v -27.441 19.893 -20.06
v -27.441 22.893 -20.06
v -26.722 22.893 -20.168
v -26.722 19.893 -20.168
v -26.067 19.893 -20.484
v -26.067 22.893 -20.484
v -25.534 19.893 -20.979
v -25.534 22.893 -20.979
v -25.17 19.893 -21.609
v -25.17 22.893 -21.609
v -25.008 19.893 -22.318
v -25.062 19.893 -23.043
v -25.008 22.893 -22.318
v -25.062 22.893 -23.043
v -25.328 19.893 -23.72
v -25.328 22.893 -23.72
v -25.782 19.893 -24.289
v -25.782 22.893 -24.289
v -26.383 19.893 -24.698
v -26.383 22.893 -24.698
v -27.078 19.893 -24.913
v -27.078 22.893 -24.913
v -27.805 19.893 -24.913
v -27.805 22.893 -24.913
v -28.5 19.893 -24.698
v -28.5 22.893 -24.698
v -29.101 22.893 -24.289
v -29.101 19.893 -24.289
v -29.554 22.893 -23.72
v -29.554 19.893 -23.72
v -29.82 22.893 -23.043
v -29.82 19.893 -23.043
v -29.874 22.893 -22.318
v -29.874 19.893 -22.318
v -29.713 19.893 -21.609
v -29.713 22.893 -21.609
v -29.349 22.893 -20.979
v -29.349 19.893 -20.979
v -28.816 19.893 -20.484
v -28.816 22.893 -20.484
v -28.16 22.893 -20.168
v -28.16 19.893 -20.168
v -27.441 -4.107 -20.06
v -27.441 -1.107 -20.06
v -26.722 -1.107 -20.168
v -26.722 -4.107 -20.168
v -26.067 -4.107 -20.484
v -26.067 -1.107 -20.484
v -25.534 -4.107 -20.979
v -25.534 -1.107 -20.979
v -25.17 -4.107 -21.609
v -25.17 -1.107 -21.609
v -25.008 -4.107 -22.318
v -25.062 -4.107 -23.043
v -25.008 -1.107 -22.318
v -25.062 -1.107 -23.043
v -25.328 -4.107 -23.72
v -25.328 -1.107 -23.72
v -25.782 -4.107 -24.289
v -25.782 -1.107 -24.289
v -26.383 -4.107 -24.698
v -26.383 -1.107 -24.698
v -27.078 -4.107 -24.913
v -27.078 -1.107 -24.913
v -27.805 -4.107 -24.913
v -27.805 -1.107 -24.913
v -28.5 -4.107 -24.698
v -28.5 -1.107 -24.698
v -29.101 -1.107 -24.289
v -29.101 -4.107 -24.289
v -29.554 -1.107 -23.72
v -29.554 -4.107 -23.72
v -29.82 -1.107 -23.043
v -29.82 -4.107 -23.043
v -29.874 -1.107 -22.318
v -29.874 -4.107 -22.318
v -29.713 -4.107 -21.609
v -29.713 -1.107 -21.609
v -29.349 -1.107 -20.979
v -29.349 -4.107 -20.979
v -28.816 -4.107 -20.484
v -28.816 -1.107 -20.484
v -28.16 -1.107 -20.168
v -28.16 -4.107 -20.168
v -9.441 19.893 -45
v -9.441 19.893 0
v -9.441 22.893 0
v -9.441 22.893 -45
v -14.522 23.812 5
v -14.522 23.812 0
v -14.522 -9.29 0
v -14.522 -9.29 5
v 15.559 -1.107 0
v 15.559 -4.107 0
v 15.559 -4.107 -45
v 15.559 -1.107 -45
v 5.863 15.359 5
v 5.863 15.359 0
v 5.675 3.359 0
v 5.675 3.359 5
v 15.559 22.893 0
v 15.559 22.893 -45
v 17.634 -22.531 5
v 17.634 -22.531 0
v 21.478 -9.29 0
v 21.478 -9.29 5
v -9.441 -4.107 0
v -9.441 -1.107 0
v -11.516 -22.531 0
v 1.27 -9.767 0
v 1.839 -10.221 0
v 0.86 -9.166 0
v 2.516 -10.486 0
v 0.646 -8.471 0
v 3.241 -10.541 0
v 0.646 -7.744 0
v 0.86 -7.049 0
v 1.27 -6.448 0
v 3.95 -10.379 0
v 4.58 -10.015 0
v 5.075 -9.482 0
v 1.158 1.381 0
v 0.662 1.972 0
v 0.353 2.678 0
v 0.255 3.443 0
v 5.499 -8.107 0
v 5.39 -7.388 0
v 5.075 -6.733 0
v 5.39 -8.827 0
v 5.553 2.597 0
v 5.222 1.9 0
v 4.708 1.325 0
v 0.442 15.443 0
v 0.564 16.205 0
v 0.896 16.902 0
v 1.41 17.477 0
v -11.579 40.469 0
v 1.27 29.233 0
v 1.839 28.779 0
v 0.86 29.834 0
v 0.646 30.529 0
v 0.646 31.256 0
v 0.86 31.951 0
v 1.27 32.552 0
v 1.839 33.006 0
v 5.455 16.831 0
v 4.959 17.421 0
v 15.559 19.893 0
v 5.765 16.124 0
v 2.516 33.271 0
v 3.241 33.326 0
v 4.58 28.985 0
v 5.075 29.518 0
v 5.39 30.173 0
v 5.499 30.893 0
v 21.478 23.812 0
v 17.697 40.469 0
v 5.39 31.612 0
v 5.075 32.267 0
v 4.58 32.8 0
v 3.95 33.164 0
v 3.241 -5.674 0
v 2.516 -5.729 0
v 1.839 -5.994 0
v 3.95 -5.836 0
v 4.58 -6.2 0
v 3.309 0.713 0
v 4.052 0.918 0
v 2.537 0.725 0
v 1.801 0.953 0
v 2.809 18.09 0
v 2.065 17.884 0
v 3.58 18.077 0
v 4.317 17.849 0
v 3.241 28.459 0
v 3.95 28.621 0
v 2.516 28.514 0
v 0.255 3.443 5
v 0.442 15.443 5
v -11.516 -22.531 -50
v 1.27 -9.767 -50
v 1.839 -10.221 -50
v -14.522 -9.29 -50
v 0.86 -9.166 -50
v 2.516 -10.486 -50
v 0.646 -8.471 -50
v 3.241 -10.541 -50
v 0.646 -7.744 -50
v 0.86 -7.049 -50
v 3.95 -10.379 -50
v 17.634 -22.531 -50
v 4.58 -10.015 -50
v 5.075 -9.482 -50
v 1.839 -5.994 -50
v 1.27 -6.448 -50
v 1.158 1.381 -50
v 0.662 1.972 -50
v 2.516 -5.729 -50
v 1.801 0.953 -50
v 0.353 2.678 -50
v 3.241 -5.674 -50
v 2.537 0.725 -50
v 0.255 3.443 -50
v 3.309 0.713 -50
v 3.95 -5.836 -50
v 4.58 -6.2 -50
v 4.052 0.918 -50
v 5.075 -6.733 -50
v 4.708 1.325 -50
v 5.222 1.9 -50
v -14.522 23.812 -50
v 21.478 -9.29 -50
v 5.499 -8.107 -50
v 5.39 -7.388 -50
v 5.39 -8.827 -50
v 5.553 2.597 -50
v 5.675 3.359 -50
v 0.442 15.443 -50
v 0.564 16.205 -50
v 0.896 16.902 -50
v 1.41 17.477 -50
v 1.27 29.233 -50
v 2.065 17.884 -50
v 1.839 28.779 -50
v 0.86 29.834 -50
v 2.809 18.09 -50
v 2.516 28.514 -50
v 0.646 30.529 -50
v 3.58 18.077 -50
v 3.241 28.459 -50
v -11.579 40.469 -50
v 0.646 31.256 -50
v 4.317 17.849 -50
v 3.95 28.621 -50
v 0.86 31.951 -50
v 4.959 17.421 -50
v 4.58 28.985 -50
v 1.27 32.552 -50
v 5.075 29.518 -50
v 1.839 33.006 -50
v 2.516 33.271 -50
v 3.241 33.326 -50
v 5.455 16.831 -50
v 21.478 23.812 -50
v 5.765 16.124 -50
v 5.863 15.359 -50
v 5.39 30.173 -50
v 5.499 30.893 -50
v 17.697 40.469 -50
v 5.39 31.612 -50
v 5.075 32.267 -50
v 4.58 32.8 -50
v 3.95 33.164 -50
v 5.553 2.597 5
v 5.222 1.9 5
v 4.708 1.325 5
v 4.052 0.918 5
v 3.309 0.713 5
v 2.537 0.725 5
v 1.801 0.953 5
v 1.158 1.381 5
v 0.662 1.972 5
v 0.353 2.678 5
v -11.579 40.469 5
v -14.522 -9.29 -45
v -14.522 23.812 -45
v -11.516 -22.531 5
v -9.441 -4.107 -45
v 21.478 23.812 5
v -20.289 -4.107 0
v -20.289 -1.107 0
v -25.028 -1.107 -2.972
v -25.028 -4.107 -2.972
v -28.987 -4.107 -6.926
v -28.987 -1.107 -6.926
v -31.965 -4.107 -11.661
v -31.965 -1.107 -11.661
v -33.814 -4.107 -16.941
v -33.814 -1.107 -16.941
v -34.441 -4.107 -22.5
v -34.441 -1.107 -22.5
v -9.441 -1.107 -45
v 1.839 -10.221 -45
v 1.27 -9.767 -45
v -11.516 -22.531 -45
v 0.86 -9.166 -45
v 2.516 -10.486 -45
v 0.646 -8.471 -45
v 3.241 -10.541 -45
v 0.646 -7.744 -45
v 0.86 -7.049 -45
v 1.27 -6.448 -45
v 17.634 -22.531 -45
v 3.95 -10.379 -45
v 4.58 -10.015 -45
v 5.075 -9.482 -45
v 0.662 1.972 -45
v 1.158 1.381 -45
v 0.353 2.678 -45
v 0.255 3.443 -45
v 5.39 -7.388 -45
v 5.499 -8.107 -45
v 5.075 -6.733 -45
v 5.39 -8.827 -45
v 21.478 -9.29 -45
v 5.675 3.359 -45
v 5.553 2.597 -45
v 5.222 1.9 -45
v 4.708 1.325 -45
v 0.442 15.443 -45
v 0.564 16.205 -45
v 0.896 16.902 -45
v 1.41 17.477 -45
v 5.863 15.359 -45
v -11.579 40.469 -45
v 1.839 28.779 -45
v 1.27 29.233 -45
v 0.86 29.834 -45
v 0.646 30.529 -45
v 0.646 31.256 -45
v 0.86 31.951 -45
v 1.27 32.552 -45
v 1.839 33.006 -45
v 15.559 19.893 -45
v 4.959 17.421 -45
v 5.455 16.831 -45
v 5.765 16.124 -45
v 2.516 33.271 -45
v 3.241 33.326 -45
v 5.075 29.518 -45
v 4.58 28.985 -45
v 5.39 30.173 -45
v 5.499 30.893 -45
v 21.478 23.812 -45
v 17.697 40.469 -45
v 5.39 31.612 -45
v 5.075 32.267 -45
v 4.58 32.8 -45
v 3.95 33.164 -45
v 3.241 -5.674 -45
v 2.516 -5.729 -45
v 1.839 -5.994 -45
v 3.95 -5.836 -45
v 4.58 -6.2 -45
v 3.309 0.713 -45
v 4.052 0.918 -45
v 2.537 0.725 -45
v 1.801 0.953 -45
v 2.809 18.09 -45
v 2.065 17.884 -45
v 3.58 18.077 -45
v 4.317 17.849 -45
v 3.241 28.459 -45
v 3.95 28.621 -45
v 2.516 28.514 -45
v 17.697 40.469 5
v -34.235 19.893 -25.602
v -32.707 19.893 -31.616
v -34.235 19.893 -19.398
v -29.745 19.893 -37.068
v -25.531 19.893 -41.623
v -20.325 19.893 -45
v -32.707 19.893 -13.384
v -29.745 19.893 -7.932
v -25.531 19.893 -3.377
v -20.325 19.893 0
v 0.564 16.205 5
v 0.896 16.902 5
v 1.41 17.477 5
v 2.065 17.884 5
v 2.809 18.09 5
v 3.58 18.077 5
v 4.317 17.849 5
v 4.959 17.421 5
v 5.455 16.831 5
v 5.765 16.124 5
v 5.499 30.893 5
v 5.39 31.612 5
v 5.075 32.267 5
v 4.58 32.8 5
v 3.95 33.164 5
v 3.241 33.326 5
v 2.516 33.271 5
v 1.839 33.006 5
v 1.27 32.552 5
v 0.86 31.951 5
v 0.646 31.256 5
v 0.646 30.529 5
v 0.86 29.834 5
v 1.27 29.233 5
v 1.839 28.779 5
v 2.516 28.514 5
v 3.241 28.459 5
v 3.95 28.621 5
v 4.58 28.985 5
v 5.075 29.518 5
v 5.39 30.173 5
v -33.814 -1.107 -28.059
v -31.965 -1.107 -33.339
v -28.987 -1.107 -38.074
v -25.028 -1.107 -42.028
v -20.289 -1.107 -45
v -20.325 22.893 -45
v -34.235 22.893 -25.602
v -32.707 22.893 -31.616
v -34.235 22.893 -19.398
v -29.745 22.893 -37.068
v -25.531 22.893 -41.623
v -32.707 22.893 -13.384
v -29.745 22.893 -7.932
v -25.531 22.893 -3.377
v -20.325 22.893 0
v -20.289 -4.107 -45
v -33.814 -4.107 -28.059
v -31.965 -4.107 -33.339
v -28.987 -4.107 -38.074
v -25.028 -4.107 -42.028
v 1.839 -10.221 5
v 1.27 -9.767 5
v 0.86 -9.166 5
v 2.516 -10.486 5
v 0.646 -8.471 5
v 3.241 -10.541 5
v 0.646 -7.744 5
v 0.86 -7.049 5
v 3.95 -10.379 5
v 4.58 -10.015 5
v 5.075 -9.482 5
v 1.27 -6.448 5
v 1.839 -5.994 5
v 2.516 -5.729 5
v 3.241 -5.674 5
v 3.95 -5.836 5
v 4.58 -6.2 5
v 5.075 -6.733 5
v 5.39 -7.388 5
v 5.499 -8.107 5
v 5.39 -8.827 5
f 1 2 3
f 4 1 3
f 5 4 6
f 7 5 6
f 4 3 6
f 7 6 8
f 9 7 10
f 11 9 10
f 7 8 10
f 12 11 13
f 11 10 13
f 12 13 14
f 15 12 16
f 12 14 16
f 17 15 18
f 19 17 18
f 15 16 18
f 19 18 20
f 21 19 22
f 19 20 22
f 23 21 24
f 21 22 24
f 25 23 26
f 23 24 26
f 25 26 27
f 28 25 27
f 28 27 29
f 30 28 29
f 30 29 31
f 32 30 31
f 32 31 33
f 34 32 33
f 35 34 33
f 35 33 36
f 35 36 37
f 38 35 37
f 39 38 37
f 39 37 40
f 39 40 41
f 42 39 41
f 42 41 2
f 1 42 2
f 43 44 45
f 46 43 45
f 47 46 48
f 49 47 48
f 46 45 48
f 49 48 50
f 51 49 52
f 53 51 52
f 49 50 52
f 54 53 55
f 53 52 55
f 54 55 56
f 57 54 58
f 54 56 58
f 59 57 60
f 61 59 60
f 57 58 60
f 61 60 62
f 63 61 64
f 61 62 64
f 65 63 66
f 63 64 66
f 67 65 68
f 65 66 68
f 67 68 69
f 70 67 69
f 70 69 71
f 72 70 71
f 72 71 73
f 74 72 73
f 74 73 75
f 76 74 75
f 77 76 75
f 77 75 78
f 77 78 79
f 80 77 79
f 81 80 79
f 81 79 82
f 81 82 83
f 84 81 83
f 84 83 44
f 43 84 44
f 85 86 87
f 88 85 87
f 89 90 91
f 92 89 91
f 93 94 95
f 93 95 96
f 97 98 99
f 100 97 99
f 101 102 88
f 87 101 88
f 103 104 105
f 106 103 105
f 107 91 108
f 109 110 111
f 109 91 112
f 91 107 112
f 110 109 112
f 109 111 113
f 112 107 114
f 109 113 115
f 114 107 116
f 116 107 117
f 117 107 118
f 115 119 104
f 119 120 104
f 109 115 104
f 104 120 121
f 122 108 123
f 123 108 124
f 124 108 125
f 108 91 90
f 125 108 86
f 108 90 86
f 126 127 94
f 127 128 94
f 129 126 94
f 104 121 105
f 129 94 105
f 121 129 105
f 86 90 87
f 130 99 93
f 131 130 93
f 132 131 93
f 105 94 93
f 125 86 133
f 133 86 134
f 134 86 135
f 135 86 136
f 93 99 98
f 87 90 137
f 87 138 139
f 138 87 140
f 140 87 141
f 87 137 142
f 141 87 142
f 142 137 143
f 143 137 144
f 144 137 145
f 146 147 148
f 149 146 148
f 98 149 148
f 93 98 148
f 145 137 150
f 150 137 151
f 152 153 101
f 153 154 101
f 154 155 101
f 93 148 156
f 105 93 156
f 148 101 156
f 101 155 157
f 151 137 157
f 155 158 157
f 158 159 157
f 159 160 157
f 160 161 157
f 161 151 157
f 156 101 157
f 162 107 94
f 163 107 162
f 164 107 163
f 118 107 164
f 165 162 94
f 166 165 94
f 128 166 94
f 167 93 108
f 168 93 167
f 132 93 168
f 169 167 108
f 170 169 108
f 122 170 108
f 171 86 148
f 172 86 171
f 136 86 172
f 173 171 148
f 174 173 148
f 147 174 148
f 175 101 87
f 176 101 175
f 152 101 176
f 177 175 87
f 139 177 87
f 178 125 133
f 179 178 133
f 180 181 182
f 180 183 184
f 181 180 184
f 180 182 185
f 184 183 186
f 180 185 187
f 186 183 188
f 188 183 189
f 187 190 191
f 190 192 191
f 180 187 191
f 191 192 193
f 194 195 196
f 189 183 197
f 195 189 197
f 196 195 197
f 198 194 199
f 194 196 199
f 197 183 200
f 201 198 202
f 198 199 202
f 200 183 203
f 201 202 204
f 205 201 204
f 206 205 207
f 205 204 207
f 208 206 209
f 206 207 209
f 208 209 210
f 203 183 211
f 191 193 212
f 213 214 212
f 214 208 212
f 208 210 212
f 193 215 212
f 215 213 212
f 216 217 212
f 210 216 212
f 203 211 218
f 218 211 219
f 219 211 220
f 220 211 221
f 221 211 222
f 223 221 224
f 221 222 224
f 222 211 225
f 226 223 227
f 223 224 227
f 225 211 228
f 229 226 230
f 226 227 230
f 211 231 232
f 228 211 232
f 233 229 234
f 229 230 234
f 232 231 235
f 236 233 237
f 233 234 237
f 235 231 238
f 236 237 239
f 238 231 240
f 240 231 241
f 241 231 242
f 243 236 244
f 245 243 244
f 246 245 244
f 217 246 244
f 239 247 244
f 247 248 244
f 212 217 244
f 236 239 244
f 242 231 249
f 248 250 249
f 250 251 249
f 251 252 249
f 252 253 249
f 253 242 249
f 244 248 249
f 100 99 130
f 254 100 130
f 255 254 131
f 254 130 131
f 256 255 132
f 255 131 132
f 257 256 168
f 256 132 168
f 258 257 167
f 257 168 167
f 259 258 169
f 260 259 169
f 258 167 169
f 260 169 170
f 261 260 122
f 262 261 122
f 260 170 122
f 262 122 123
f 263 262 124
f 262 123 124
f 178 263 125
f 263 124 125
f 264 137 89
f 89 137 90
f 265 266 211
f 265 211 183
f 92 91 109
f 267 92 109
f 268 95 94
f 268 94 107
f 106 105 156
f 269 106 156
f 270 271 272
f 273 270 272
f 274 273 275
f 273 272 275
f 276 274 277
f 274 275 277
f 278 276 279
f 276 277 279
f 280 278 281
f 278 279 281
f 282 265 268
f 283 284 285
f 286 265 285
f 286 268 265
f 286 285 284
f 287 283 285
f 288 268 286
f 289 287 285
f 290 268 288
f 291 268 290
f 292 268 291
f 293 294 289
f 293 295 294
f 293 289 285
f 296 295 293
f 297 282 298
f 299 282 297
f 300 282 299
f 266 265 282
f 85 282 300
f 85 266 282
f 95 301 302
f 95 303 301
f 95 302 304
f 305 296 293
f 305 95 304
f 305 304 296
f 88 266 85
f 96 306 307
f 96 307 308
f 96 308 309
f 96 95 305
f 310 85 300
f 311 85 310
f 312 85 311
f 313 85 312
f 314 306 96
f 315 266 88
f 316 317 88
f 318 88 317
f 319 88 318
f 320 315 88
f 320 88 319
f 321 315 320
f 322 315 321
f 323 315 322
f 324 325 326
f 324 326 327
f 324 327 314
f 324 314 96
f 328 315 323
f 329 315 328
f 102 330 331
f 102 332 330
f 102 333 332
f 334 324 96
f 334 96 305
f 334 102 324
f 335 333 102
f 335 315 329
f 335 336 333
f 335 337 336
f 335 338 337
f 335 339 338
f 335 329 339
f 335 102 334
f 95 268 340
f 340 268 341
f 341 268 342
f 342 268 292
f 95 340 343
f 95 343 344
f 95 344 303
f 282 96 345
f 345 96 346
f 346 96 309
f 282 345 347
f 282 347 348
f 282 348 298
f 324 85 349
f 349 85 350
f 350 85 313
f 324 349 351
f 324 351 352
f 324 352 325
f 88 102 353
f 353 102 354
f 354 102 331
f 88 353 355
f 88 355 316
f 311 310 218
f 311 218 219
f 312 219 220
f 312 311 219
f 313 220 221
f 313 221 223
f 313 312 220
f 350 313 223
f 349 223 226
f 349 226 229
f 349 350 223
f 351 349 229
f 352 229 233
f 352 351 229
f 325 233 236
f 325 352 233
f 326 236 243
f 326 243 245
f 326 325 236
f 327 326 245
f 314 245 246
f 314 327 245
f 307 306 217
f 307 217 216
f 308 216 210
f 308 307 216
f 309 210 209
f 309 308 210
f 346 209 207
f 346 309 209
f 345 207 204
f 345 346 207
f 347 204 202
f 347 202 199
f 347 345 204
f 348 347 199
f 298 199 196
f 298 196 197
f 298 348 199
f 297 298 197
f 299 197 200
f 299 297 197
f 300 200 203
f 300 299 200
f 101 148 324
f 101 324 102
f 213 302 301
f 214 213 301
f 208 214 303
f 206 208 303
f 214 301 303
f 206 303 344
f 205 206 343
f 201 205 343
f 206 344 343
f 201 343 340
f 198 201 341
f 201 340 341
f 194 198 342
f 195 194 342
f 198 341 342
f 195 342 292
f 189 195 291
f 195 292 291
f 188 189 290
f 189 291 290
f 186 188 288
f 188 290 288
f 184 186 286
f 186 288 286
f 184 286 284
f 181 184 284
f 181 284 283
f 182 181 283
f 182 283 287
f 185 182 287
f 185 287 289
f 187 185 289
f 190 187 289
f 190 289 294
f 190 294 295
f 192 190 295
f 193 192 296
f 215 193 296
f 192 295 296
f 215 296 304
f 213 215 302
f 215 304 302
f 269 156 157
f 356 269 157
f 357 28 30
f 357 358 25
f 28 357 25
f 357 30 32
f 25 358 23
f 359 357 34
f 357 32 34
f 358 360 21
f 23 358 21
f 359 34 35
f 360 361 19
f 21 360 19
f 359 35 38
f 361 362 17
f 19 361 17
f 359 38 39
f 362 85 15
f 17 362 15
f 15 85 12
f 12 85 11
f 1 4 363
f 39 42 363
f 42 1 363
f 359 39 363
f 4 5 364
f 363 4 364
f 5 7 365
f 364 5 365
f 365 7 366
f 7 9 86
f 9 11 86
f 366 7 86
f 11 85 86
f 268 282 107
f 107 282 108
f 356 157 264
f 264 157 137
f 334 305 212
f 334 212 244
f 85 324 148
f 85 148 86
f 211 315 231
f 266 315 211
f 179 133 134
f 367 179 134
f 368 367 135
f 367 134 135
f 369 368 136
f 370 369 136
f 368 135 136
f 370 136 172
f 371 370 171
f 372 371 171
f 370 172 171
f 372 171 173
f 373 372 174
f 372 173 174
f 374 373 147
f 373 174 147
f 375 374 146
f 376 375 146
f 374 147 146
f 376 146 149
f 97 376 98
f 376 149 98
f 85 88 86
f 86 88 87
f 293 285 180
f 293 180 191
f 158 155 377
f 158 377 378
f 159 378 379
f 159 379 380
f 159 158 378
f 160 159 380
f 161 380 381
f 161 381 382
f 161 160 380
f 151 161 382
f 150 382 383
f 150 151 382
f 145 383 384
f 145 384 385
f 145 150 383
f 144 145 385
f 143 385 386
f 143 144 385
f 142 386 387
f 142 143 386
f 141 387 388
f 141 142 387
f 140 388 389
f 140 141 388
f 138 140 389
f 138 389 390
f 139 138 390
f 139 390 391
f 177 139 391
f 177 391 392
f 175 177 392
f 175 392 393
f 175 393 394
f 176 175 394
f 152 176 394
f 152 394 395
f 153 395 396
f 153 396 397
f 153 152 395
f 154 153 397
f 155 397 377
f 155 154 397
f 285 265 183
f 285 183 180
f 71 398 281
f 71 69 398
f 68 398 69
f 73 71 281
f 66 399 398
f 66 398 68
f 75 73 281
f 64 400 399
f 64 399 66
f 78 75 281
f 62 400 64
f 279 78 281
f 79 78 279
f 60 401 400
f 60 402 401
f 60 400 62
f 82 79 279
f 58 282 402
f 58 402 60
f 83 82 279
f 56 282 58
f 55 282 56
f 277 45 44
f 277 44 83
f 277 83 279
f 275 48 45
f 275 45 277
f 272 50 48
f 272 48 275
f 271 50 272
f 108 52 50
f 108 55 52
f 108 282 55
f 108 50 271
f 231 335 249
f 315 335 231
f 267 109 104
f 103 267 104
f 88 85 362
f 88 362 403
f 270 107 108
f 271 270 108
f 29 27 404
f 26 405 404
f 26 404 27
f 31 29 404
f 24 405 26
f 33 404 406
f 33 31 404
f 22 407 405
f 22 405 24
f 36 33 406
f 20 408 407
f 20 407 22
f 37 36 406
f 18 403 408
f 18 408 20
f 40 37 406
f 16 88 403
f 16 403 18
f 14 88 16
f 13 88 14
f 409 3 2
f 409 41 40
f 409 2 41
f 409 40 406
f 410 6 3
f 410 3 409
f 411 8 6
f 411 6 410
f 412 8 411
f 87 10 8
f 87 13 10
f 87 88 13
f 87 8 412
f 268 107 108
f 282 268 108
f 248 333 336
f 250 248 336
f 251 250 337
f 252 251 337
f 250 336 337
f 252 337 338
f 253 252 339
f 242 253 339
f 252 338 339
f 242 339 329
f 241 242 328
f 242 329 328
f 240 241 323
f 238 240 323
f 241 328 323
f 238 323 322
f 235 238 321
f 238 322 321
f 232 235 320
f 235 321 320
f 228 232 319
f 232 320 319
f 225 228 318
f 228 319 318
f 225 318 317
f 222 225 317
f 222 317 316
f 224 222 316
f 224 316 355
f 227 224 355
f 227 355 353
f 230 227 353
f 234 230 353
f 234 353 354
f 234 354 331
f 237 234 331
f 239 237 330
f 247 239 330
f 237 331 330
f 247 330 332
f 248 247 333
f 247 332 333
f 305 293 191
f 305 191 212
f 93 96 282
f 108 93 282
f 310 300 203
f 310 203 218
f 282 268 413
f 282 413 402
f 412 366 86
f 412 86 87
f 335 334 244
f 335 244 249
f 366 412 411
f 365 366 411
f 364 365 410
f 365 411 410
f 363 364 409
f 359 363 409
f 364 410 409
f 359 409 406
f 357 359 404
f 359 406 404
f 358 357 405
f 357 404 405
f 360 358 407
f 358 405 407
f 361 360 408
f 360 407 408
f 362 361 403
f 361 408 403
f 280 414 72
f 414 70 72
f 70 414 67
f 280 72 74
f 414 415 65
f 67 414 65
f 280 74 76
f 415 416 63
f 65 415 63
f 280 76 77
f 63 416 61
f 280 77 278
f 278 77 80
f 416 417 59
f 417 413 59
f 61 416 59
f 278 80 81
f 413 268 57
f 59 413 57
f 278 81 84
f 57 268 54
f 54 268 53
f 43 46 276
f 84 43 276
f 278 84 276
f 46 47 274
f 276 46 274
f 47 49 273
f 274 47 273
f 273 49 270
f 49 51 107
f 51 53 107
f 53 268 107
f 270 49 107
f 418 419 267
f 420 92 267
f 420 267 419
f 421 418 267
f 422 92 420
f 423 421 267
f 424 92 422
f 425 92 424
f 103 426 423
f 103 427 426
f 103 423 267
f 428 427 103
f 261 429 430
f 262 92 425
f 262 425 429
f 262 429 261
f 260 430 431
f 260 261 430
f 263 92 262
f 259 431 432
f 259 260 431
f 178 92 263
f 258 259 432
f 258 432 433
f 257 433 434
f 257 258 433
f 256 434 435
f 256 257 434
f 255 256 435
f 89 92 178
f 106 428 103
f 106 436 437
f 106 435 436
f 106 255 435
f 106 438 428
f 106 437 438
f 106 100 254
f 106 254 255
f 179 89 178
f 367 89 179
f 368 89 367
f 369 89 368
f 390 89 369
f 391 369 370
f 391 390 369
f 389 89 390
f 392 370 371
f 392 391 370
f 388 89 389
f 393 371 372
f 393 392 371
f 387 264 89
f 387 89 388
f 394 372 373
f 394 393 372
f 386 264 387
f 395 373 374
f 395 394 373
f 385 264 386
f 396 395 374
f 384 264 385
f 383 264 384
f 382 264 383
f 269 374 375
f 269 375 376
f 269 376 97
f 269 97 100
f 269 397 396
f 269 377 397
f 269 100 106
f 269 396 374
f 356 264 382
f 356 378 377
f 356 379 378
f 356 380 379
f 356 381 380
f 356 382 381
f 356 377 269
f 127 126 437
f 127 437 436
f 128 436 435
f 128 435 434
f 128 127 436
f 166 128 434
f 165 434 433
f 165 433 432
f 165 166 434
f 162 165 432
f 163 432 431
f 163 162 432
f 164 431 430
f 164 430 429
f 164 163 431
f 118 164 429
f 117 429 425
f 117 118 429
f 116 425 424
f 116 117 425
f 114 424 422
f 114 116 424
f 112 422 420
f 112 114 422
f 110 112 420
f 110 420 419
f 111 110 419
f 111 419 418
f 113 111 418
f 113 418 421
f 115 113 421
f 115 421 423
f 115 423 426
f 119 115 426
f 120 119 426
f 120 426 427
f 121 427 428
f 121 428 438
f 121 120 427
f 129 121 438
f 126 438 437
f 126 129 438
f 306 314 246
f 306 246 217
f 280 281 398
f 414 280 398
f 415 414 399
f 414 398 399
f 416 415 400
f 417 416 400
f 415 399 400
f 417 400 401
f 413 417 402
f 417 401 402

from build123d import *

# Parameters (mm, degrees)
SKETCH_1_R           = 2.44
SKETCH_1_W           = 25
SKETCH_1_H           = 3
EXTRUDE_1_DEPTH      = 5
EXTRUDE_5_DEPTH      = 22.5
EXTRUDE_5_DEPTH_BACK = 5
SKETCH_6_W           = 25
SKETCH_6_H           = 3
SKETCH_7_W           = 45
SKETCH_7_H           = 3
EXTRUDE_6_DEPTH      = 25
CUT_EXTRUDE_1_DEPTH  = 3
SKETCH_9_W           = 45
SKETCH_9_H           = 3
EXTRUDE_7_DEPTH      = 25
CUT_EXTRUDE_2_DEPTH  = 3
SKETCH_11_R          = 2.44
CUT_EXTRUDE_4_DEPTH  = 27


with BuildPart() as part:
    # 草图1 → 凸台-拉伸1 (new body)
    with BuildSketch(Plane.XY):
        Polygon((17.696605027, 40.469491525), (-11.579043351, 40.469491525), (-14.522033898, 23.811864407), (-14.522033898, -9.289830508), (-11.516336634, -22.530508475), (17.633898309, -22.530508475), (21.477966102, -9.289830508), (21.477966102, 23.811864407), align=None)
        with Locations((3.058780838, 30.892569201)):
            Circle(SKETCH_1_R, mode=Mode.SUBTRACT)
        with Locations((3.058780838, -8.107430799)):
            Circle(SKETCH_1_R, mode=Mode.SUBTRACT)
        with Locations((3.058780838, 21.392569201)):
            Rectangle(SKETCH_1_W, SKETCH_1_H, mode=Mode.SUBTRACT)
        with Locations((3.058780838, -2.607430799)):
            Rectangle(SKETCH_1_W, SKETCH_1_H, mode=Mode.SUBTRACT)
        with BuildLine():
            Line((0.254992558, 3.443382419), (0.442492558, 15.443382419))
            ThreePointArc((0.442492558, 15.443382419), (3.194875186, 18.111076351), (5.862569118, 15.358693723))
            Line((5.862569118, 15.358693723), (5.675069118, 3.358693723))
            ThreePointArc((5.675069118, 3.358693723), (2.92268649, 0.690999791), (0.254992558, 3.443382419))
        make_face(mode=Mode.SUBTRACT)
    extrude(amount=EXTRUDE_1_DEPTH)

    # 草图6 → 凸台-拉伸5 (add, two sides: drawn at the far end of the back side and taken through both)
    with BuildSketch(Plane(origin=(0, 0, 0), x_dir=(-1, 0, 0), z_dir=(0, 0, -1)).offset(-EXTRUDE_5_DEPTH_BACK)):
        with Locations((-3.058780838, 21.392569201)):
            Rectangle(SKETCH_6_W, SKETCH_6_H)
        with Locations((-3.058780838, -2.607430799)):
            Rectangle(SKETCH_6_W, SKETCH_6_H)
    extrude(amount=EXTRUDE_5_DEPTH + EXTRUDE_5_DEPTH_BACK)

    # 镜向2: part across plane


with BuildPart() as part_1:
    add(part.part)
    add(part.part.mirror(Plane(origin=(0, 0, -22.5), x_dir=(1, 0, 0), z_dir=(0, 0, -1))))


with BuildPart() as body_2:
    # 草图7 → 凸台-拉伸6 (new body)
    with BuildSketch(Plane.ZY.offset(9.441219162)):
        with Locations((-22.5, 21.392569201)):
            Rectangle(SKETCH_7_W, SKETCH_7_H)
    extrude(amount=EXTRUDE_6_DEPTH)

    # 草图8 → 切除-拉伸1 (cut)
    with BuildSketch(Plane(origin=(0, 22.892569201, 0), x_dir=(1, 0, 0), z_dir=(0, 1, 0))):
        with BuildLine():
            Line((-34.441219162, 0), (-20.325379476, 0))
            ThreePointArc((-20.325379476, 0), (-34.428132117, 22.5), (-20.325379476, 45))
            Line((-20.325379476, 45), (-34.441219162, 45))
            Line((-34.441219162, 45), (-34.441219162, 0))
        make_face()
    extrude(amount=-CUT_EXTRUDE_1_DEPTH, mode=Mode.SUBTRACT)


with BuildPart() as body_3:
    # 草图9 → 凸台-拉伸7 (new body)
    with BuildSketch(Plane.ZY.offset(9.441219162)):
        with Locations((-22.5, -2.607430799)):
            Rectangle(SKETCH_9_W, SKETCH_9_H)
    extrude(amount=EXTRUDE_7_DEPTH)

    # 草图10 → 切除-拉伸2 (cut)
    with BuildSketch(Plane(origin=(0, -1.107430799, 0), x_dir=(1, 0, 0), z_dir=(0, 1, 0))):
        with BuildLine():
            ThreePointArc((-34.441219162, 22.5), (-30.609078149, 35.790297055), (-20.289258761, 45))
            Line((-20.289258761, 45), (-34.441219162, 45))
            Line((-34.441219162, 45), (-34.441219162, 22.5))
        make_face()
        with BuildLine():
            Line((-34.441219162, 0), (-20.289258761, 0))
            ThreePointArc((-20.289258761, 0), (-30.609078149, 9.209702945), (-34.441219162, 22.5))
            Line((-34.441219162, 22.5), (-34.441219162, 0))
        make_face()
    extrude(amount=-CUT_EXTRUDE_2_DEPTH, mode=Mode.SUBTRACT)


with BuildPart() as cut_extrude_4_tool:
    # 草图11 → 切除-拉伸4 (new body)
    with BuildSketch(Plane(origin=(0, 22.892569201, 0), x_dir=(1, 0, 0), z_dir=(0, 1, 0))):
        with Locations(Location((-27.441219162, 22.5, 0), (0, 0, 270))):
            Circle(SKETCH_11_R)
    extrude(amount=-CUT_EXTRUDE_4_DEPTH)


with BuildPart() as body_2_1:
    add(body_2.part)

    # 切除-拉伸4: cut by cut_extrude_4_tool
    add(cut_extrude_4_tool.part, mode=Mode.SUBTRACT)


with BuildPart() as body_3_1:
    add(body_3.part)

    # 切除-拉伸4: cut by cut_extrude_4_tool
    add(cut_extrude_4_tool.part, mode=Mode.SUBTRACT)


solid = Compound([part_1.part, body_2_1.part, body_3_1.part])
